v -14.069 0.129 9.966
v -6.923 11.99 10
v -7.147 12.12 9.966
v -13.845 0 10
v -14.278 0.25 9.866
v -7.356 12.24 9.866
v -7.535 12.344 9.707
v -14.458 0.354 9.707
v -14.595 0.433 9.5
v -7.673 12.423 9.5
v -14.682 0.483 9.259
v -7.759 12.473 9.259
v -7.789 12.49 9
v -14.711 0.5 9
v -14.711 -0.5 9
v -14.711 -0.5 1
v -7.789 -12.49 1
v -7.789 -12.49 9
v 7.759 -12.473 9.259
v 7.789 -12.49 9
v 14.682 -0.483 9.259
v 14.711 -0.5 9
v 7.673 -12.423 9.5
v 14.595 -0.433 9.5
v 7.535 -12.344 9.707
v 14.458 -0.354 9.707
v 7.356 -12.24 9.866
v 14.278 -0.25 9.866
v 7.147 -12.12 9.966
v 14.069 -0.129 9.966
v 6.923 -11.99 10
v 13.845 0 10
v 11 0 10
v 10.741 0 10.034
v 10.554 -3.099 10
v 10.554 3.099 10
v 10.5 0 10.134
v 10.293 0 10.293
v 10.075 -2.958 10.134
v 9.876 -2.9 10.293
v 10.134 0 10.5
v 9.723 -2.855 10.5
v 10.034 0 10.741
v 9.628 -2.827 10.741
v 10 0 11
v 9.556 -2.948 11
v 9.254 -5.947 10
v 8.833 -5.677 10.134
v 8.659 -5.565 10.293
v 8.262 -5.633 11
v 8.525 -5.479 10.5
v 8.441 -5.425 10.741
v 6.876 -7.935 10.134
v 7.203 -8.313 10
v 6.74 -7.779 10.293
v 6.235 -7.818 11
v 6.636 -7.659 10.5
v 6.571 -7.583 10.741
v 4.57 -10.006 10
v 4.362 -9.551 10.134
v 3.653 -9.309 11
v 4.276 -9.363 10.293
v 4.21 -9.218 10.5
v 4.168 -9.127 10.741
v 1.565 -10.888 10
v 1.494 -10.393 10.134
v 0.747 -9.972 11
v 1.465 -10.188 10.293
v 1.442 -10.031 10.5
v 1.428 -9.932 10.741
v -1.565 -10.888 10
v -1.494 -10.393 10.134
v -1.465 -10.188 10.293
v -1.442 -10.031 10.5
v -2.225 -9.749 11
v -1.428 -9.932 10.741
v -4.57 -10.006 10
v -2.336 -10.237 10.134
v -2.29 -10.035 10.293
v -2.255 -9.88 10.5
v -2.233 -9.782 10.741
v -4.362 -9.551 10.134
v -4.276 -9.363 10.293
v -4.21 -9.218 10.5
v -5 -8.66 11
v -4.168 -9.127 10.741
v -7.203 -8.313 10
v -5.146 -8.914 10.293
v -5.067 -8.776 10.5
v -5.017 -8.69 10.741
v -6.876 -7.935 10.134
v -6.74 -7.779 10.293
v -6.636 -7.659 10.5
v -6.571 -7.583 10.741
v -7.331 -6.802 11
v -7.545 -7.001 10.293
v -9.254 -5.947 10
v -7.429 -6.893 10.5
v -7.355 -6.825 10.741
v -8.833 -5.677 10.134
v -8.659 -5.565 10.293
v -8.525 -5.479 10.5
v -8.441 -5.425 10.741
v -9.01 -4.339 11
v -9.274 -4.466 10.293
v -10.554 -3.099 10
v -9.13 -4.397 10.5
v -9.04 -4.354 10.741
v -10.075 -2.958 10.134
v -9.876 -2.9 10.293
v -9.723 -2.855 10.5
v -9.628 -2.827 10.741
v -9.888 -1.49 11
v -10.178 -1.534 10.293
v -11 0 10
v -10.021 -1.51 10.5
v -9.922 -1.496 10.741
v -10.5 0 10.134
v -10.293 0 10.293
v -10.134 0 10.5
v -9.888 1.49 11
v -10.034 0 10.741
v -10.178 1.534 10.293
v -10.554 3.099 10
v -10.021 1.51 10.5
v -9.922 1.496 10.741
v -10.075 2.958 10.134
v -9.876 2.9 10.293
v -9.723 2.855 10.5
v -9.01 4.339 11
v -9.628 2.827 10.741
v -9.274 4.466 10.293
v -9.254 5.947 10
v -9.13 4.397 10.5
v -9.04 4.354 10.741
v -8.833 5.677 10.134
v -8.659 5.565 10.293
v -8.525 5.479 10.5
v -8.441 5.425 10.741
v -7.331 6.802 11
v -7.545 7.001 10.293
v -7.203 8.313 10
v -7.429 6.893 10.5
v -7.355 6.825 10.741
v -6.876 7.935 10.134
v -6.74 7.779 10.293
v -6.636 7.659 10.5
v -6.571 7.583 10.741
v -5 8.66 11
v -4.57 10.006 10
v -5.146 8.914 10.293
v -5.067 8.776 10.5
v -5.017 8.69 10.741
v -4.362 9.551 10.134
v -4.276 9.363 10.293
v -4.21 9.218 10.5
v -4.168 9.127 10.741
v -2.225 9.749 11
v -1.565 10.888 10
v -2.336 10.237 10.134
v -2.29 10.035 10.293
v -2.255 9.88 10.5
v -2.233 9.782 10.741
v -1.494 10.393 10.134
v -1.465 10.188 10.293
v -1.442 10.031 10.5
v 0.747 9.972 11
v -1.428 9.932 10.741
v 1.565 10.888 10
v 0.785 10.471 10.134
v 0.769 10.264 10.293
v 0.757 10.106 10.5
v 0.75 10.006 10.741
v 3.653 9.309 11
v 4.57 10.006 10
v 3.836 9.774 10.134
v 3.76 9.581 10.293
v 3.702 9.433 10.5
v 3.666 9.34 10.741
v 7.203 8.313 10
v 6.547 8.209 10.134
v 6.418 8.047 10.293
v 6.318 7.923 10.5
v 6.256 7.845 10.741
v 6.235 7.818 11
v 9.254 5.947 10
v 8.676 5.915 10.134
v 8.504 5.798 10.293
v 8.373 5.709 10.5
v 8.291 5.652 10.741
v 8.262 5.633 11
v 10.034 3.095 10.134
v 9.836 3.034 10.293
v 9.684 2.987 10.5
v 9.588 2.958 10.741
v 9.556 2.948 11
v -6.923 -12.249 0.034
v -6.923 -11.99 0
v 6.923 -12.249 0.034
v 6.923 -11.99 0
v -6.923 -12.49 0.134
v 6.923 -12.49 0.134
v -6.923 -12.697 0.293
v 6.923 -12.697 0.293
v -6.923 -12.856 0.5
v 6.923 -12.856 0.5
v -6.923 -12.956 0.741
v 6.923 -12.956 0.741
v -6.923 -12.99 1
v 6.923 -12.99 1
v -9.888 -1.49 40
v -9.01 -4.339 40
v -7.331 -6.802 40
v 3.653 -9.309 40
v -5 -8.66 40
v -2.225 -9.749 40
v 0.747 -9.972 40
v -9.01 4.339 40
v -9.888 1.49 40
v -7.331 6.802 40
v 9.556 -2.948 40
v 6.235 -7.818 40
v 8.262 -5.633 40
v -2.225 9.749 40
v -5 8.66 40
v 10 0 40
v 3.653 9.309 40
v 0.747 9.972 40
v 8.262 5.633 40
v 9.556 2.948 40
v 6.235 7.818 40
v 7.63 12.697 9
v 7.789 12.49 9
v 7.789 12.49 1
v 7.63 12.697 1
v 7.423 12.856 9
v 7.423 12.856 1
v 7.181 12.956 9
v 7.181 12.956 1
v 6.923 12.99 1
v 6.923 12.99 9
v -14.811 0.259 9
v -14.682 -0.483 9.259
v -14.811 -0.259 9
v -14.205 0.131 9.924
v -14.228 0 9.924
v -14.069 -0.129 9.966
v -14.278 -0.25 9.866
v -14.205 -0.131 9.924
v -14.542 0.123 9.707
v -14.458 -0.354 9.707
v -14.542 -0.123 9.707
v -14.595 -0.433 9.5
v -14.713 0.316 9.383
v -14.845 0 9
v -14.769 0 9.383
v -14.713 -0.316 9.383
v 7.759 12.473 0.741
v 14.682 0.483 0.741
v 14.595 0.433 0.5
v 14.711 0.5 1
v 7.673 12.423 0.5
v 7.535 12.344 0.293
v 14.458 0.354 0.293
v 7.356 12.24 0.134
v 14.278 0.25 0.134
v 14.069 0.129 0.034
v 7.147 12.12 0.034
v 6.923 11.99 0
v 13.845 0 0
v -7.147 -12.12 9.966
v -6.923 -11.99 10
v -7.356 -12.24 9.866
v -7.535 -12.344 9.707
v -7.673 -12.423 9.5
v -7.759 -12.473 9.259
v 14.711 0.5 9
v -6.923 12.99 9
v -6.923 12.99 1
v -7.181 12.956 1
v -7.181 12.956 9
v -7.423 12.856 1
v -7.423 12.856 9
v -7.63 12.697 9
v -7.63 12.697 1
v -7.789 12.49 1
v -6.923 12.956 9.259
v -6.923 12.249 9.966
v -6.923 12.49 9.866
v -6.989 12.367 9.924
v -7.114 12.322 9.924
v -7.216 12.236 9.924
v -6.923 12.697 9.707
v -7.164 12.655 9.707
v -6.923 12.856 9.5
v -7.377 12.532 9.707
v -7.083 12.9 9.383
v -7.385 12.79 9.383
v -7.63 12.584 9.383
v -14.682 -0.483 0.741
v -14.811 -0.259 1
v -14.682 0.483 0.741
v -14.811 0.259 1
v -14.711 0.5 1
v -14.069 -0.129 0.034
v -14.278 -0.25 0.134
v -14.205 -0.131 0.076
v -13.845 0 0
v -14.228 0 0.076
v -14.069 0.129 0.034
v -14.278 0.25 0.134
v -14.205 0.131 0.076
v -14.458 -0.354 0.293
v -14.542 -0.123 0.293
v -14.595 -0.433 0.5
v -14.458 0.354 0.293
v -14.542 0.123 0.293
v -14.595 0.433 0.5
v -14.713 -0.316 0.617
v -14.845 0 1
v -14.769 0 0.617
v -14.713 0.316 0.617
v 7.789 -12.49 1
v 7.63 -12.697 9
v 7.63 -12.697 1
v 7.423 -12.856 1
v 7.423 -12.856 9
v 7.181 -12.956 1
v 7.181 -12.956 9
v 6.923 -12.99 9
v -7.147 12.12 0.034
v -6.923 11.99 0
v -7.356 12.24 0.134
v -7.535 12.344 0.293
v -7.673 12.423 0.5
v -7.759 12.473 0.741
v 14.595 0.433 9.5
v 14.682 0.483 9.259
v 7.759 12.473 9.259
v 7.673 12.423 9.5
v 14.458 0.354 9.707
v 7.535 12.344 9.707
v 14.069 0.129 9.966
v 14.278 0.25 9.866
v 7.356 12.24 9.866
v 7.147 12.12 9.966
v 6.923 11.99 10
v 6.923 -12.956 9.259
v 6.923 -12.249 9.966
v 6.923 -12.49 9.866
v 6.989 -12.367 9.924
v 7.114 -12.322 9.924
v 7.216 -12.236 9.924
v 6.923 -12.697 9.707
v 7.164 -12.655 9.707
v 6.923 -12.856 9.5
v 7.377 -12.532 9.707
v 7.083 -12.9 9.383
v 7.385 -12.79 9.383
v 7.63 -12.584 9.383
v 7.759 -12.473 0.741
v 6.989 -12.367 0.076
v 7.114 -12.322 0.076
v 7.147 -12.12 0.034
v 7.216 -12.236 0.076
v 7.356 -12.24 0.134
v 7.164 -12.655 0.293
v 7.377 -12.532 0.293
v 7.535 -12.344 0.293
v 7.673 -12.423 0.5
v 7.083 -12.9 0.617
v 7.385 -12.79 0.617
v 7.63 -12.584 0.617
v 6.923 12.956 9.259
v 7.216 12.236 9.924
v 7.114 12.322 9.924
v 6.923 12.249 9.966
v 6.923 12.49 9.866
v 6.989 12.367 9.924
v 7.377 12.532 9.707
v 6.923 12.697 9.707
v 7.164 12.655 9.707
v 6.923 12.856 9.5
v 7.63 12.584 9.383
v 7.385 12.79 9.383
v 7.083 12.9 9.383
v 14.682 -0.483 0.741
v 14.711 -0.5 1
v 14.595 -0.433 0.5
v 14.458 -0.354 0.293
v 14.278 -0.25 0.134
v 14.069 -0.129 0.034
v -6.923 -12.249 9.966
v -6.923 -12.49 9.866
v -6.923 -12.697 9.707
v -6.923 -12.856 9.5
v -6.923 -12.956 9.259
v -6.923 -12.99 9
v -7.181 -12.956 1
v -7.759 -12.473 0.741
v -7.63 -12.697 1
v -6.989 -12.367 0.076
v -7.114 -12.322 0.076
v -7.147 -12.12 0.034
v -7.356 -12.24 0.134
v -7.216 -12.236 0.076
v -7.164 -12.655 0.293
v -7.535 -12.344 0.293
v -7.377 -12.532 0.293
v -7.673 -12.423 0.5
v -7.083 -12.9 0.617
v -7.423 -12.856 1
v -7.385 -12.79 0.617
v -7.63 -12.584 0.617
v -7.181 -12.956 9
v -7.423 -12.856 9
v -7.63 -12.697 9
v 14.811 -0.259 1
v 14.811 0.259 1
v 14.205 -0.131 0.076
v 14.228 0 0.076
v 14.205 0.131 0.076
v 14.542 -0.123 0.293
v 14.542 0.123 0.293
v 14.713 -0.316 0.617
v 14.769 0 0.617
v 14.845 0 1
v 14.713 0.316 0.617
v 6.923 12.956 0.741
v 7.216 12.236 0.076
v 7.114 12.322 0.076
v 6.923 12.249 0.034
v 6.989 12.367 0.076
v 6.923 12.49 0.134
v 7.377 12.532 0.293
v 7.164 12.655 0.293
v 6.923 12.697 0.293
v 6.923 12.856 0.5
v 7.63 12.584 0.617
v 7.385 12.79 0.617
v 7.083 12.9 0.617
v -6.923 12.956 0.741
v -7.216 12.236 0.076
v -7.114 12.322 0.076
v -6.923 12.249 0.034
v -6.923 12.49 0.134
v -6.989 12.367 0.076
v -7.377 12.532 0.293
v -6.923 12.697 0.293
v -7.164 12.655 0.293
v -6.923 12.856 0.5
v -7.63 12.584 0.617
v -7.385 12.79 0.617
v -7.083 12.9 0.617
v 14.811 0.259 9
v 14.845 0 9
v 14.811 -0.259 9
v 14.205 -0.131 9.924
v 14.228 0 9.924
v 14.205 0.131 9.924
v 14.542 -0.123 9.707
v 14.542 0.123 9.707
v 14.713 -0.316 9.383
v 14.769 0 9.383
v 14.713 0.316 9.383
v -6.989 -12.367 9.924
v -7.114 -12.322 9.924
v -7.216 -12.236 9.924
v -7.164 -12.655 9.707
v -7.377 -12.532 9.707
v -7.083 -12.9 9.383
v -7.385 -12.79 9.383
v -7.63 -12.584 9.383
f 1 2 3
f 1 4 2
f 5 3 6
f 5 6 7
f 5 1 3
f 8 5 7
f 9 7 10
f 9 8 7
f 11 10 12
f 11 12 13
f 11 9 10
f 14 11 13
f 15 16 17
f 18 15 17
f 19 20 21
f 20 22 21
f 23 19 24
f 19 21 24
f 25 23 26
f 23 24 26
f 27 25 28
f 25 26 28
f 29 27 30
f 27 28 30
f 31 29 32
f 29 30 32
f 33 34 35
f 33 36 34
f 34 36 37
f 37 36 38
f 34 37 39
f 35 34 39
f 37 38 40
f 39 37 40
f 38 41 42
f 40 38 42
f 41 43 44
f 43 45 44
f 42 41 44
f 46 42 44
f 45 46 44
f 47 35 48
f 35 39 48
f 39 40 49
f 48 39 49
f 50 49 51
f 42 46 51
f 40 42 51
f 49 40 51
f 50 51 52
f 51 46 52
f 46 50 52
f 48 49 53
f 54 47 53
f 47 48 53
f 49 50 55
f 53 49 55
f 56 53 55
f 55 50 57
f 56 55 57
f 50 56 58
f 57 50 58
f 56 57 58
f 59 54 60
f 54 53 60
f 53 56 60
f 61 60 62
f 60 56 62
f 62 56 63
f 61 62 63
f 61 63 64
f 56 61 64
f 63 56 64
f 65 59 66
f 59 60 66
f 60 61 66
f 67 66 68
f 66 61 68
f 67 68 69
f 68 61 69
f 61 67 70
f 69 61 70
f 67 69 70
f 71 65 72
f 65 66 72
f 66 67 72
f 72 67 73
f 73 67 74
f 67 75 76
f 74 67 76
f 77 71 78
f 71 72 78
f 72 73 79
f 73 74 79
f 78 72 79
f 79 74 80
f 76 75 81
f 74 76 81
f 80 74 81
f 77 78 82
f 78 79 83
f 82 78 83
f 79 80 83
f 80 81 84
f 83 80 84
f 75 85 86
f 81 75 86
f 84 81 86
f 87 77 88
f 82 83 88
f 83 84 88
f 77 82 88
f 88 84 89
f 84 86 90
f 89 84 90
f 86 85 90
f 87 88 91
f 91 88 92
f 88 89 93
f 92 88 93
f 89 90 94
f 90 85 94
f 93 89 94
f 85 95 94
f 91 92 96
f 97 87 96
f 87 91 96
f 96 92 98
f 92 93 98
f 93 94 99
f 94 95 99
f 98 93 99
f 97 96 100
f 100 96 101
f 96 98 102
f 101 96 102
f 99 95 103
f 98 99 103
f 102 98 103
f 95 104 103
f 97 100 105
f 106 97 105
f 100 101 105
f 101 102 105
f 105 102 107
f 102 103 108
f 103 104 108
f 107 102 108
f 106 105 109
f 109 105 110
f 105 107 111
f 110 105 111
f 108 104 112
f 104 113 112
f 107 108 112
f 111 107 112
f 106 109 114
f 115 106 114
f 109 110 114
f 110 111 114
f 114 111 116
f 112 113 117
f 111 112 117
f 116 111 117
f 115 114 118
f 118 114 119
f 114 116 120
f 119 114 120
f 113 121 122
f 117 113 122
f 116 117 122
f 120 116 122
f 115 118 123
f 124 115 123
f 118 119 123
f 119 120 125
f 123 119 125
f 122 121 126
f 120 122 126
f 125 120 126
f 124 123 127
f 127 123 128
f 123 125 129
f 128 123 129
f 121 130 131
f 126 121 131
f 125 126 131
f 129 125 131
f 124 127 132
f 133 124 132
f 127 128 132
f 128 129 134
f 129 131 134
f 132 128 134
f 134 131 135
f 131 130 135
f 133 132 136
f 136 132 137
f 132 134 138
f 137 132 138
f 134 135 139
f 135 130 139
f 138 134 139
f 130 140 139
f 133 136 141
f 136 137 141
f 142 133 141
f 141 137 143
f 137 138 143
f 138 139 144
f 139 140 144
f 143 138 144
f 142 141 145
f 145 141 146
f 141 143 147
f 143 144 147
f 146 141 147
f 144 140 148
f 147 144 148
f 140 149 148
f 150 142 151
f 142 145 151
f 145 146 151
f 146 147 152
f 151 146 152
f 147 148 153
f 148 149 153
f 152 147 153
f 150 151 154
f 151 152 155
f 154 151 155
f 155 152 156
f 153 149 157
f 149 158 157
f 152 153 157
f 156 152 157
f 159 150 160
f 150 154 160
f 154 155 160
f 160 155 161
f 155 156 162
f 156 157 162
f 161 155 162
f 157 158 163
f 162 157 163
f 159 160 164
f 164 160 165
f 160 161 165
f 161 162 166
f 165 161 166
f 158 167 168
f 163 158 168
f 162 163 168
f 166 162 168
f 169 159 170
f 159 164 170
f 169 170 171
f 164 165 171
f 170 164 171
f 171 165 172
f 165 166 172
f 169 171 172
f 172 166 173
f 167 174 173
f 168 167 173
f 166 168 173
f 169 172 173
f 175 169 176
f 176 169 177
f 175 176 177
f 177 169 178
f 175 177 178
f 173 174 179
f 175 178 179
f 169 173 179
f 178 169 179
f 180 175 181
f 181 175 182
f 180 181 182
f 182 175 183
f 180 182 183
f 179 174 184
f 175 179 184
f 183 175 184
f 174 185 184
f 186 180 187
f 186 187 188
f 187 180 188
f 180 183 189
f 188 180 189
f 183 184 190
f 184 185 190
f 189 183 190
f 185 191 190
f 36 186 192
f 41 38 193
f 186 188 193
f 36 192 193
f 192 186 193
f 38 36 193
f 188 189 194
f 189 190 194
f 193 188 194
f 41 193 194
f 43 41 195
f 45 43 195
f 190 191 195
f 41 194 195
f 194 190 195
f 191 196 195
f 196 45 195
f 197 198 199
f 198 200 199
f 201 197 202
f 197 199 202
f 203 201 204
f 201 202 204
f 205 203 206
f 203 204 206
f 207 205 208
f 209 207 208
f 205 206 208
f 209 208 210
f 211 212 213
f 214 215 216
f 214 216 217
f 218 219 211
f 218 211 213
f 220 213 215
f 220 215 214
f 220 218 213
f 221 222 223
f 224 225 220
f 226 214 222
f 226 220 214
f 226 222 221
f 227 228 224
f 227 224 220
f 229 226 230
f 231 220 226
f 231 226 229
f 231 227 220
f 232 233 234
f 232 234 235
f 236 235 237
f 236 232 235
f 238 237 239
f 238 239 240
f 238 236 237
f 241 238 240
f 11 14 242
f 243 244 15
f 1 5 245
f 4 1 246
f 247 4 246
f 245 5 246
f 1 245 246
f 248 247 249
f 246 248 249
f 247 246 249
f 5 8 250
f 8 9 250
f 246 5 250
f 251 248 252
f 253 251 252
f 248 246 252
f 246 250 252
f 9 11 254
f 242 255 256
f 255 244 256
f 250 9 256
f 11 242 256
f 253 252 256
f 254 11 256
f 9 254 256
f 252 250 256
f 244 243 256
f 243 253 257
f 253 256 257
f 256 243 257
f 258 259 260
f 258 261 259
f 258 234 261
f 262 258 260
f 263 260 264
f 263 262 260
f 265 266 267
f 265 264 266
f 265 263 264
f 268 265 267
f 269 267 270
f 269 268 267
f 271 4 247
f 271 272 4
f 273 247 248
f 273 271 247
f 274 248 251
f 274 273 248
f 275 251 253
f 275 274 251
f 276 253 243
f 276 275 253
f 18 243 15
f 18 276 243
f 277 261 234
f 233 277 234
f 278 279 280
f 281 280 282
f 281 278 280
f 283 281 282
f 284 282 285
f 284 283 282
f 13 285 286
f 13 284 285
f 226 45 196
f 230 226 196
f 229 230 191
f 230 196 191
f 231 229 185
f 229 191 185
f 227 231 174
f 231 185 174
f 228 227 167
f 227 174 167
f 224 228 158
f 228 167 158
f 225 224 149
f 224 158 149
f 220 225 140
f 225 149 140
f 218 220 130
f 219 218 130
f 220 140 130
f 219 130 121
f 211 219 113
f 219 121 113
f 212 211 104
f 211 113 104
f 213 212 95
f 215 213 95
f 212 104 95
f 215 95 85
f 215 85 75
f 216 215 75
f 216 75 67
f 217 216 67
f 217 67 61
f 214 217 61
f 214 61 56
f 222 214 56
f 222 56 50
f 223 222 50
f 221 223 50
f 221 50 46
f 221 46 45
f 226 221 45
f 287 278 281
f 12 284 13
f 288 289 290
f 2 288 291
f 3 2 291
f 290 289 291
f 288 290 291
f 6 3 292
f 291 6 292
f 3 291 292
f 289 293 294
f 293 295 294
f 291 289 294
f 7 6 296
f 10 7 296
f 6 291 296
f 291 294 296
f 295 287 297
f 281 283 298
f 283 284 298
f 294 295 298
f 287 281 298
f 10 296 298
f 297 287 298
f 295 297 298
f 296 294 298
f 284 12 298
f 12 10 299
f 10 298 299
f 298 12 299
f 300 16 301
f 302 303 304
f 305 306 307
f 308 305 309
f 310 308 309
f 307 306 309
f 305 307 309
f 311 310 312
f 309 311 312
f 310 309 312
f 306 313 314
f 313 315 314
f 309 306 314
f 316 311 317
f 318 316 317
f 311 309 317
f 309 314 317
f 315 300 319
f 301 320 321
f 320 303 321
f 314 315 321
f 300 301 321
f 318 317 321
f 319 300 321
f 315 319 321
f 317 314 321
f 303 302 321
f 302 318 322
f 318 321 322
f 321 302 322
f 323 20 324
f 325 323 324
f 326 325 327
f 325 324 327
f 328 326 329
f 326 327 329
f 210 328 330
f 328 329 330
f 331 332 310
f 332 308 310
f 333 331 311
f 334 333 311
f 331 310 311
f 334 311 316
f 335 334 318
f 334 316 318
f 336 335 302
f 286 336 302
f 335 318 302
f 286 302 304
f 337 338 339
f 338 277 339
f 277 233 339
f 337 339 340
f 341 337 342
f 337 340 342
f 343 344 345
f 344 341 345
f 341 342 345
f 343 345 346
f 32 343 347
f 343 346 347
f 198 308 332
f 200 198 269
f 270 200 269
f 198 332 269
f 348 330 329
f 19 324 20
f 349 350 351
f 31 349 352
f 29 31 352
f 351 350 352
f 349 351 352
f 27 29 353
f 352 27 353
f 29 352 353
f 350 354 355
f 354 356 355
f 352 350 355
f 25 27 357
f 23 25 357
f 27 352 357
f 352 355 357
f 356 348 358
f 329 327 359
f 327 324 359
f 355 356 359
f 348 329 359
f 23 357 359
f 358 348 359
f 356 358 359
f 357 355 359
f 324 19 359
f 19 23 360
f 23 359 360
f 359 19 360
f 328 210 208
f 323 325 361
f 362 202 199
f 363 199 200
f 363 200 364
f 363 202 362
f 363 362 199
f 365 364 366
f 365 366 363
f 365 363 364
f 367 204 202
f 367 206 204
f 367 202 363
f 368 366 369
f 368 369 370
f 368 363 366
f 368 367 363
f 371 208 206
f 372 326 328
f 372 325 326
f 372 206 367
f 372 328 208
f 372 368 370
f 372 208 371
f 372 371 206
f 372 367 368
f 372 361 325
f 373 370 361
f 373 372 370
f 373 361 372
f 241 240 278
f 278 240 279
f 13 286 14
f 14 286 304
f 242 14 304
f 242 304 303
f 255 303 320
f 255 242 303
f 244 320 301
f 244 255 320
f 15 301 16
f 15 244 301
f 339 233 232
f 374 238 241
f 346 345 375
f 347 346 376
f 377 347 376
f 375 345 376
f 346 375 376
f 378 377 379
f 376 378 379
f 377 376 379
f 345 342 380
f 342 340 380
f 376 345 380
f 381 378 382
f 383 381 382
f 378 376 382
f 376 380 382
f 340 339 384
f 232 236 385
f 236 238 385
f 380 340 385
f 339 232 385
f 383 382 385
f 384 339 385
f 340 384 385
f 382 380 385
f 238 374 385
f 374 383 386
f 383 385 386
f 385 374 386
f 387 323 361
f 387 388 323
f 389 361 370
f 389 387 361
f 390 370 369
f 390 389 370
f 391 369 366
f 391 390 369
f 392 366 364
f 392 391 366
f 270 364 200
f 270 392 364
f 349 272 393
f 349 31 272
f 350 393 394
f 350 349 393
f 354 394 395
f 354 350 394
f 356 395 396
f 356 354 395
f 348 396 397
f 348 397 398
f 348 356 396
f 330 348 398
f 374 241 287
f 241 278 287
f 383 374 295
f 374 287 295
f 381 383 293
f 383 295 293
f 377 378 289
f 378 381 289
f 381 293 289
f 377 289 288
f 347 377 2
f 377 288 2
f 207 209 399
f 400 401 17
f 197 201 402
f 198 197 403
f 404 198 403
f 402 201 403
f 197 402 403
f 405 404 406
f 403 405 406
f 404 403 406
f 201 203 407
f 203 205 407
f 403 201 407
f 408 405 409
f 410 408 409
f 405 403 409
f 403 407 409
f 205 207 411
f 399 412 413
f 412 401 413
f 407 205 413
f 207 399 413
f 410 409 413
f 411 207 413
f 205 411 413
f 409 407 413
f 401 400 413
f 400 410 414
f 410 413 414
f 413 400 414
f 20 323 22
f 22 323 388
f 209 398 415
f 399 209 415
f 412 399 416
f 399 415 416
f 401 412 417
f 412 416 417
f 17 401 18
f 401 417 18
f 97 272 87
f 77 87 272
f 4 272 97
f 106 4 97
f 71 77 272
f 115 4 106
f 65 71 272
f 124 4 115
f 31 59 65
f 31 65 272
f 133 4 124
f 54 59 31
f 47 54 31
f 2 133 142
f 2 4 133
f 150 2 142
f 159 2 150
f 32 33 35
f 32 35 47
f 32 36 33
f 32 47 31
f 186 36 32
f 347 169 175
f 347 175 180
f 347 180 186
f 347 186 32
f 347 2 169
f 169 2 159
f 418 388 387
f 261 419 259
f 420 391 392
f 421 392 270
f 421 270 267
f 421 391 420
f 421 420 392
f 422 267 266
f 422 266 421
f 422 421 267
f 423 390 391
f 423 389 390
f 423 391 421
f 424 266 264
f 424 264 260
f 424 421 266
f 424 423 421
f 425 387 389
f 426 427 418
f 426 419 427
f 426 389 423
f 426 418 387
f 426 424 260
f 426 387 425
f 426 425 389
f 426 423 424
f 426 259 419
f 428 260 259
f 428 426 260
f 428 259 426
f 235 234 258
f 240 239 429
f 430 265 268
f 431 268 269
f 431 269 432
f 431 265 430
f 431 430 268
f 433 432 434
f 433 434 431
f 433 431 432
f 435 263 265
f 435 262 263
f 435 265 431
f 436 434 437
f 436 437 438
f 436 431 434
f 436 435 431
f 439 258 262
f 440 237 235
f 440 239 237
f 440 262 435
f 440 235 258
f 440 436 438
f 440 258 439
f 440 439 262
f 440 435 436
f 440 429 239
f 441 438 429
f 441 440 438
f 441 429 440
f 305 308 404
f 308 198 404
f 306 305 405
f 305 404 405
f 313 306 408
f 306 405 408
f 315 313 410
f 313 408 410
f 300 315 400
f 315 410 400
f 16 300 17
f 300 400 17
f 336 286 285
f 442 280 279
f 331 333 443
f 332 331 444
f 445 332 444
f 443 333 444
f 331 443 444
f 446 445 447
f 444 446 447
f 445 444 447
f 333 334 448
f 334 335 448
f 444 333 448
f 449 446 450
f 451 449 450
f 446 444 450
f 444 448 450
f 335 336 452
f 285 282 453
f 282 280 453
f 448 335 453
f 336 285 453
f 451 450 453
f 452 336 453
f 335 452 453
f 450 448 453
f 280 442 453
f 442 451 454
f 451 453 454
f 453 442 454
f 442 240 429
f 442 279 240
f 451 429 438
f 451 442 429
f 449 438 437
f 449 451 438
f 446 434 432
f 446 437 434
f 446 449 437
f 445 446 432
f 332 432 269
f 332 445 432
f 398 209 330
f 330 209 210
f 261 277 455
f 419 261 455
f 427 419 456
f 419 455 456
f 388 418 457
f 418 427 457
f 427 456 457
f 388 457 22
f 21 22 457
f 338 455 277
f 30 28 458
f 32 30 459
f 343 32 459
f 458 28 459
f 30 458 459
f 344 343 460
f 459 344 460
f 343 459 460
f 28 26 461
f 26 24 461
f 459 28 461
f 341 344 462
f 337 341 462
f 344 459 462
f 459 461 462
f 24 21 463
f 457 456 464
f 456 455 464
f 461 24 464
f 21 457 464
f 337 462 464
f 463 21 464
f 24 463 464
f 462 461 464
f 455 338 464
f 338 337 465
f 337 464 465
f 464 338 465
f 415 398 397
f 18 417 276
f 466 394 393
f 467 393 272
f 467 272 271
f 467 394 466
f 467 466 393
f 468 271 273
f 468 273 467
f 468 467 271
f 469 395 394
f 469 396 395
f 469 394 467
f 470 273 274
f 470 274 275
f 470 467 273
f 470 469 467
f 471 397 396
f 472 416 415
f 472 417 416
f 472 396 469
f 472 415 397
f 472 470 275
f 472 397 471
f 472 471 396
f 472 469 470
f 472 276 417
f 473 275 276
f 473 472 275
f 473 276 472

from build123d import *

# Parameters (mm, degrees)
SKETCH_R     = 10
PAD_DEPTH    = 40
PAD001_DEPTH = 10
FILLET_R     = 1


with BuildPart() as part:
    # Sketch → Pad (new body)
    with BuildSketch(Plane.XY):
        Circle(SKETCH_R)
    extrude(amount=PAD_DEPTH)

    # Sketch001 → Pad001 (join)
    with BuildSketch(Plane.XY):
        Polygon((15, 0), (7.5, 12.990381), (-7.5, 12.990381), (-15, 0), (-7.5, -12.990381), (7.5, -12.990381), align=None)
    extrude(amount=PAD001_DEPTH)

    # Fillet
    fillet_edges = [part.edges().sort_by_distance(p)[0] for p in [
        (-7.5, -12.990381, 5),
        (7.5, -12.990381, 5),
        (0, -12.990381, 0),
        (0, -12.990381, 10),
        (15, 0, 5),
        (11.25, -6.495191, 0),
        (11.25, -6.495191, 10),
        (11.25, 6.495191, 10),
        (0, 12.990381, 10),
        (-11.25, 6.495191, 10),
        (-11.25, -6.495191, 10),
        (-10, 0, 10),
        (-15, 0, 5),
        (-11.25, -6.495191, 0),
        (-7.5, 12.990381, 5),
        (-11.25, 6.495191, 0),
        (11.25, 6.495191, 0),
        (0, 12.990381, 0),
        (7.5, 12.990381, 5),
    ]]
    fillet(fillet_edges, radius=FILLET_R)


solid = part.part
